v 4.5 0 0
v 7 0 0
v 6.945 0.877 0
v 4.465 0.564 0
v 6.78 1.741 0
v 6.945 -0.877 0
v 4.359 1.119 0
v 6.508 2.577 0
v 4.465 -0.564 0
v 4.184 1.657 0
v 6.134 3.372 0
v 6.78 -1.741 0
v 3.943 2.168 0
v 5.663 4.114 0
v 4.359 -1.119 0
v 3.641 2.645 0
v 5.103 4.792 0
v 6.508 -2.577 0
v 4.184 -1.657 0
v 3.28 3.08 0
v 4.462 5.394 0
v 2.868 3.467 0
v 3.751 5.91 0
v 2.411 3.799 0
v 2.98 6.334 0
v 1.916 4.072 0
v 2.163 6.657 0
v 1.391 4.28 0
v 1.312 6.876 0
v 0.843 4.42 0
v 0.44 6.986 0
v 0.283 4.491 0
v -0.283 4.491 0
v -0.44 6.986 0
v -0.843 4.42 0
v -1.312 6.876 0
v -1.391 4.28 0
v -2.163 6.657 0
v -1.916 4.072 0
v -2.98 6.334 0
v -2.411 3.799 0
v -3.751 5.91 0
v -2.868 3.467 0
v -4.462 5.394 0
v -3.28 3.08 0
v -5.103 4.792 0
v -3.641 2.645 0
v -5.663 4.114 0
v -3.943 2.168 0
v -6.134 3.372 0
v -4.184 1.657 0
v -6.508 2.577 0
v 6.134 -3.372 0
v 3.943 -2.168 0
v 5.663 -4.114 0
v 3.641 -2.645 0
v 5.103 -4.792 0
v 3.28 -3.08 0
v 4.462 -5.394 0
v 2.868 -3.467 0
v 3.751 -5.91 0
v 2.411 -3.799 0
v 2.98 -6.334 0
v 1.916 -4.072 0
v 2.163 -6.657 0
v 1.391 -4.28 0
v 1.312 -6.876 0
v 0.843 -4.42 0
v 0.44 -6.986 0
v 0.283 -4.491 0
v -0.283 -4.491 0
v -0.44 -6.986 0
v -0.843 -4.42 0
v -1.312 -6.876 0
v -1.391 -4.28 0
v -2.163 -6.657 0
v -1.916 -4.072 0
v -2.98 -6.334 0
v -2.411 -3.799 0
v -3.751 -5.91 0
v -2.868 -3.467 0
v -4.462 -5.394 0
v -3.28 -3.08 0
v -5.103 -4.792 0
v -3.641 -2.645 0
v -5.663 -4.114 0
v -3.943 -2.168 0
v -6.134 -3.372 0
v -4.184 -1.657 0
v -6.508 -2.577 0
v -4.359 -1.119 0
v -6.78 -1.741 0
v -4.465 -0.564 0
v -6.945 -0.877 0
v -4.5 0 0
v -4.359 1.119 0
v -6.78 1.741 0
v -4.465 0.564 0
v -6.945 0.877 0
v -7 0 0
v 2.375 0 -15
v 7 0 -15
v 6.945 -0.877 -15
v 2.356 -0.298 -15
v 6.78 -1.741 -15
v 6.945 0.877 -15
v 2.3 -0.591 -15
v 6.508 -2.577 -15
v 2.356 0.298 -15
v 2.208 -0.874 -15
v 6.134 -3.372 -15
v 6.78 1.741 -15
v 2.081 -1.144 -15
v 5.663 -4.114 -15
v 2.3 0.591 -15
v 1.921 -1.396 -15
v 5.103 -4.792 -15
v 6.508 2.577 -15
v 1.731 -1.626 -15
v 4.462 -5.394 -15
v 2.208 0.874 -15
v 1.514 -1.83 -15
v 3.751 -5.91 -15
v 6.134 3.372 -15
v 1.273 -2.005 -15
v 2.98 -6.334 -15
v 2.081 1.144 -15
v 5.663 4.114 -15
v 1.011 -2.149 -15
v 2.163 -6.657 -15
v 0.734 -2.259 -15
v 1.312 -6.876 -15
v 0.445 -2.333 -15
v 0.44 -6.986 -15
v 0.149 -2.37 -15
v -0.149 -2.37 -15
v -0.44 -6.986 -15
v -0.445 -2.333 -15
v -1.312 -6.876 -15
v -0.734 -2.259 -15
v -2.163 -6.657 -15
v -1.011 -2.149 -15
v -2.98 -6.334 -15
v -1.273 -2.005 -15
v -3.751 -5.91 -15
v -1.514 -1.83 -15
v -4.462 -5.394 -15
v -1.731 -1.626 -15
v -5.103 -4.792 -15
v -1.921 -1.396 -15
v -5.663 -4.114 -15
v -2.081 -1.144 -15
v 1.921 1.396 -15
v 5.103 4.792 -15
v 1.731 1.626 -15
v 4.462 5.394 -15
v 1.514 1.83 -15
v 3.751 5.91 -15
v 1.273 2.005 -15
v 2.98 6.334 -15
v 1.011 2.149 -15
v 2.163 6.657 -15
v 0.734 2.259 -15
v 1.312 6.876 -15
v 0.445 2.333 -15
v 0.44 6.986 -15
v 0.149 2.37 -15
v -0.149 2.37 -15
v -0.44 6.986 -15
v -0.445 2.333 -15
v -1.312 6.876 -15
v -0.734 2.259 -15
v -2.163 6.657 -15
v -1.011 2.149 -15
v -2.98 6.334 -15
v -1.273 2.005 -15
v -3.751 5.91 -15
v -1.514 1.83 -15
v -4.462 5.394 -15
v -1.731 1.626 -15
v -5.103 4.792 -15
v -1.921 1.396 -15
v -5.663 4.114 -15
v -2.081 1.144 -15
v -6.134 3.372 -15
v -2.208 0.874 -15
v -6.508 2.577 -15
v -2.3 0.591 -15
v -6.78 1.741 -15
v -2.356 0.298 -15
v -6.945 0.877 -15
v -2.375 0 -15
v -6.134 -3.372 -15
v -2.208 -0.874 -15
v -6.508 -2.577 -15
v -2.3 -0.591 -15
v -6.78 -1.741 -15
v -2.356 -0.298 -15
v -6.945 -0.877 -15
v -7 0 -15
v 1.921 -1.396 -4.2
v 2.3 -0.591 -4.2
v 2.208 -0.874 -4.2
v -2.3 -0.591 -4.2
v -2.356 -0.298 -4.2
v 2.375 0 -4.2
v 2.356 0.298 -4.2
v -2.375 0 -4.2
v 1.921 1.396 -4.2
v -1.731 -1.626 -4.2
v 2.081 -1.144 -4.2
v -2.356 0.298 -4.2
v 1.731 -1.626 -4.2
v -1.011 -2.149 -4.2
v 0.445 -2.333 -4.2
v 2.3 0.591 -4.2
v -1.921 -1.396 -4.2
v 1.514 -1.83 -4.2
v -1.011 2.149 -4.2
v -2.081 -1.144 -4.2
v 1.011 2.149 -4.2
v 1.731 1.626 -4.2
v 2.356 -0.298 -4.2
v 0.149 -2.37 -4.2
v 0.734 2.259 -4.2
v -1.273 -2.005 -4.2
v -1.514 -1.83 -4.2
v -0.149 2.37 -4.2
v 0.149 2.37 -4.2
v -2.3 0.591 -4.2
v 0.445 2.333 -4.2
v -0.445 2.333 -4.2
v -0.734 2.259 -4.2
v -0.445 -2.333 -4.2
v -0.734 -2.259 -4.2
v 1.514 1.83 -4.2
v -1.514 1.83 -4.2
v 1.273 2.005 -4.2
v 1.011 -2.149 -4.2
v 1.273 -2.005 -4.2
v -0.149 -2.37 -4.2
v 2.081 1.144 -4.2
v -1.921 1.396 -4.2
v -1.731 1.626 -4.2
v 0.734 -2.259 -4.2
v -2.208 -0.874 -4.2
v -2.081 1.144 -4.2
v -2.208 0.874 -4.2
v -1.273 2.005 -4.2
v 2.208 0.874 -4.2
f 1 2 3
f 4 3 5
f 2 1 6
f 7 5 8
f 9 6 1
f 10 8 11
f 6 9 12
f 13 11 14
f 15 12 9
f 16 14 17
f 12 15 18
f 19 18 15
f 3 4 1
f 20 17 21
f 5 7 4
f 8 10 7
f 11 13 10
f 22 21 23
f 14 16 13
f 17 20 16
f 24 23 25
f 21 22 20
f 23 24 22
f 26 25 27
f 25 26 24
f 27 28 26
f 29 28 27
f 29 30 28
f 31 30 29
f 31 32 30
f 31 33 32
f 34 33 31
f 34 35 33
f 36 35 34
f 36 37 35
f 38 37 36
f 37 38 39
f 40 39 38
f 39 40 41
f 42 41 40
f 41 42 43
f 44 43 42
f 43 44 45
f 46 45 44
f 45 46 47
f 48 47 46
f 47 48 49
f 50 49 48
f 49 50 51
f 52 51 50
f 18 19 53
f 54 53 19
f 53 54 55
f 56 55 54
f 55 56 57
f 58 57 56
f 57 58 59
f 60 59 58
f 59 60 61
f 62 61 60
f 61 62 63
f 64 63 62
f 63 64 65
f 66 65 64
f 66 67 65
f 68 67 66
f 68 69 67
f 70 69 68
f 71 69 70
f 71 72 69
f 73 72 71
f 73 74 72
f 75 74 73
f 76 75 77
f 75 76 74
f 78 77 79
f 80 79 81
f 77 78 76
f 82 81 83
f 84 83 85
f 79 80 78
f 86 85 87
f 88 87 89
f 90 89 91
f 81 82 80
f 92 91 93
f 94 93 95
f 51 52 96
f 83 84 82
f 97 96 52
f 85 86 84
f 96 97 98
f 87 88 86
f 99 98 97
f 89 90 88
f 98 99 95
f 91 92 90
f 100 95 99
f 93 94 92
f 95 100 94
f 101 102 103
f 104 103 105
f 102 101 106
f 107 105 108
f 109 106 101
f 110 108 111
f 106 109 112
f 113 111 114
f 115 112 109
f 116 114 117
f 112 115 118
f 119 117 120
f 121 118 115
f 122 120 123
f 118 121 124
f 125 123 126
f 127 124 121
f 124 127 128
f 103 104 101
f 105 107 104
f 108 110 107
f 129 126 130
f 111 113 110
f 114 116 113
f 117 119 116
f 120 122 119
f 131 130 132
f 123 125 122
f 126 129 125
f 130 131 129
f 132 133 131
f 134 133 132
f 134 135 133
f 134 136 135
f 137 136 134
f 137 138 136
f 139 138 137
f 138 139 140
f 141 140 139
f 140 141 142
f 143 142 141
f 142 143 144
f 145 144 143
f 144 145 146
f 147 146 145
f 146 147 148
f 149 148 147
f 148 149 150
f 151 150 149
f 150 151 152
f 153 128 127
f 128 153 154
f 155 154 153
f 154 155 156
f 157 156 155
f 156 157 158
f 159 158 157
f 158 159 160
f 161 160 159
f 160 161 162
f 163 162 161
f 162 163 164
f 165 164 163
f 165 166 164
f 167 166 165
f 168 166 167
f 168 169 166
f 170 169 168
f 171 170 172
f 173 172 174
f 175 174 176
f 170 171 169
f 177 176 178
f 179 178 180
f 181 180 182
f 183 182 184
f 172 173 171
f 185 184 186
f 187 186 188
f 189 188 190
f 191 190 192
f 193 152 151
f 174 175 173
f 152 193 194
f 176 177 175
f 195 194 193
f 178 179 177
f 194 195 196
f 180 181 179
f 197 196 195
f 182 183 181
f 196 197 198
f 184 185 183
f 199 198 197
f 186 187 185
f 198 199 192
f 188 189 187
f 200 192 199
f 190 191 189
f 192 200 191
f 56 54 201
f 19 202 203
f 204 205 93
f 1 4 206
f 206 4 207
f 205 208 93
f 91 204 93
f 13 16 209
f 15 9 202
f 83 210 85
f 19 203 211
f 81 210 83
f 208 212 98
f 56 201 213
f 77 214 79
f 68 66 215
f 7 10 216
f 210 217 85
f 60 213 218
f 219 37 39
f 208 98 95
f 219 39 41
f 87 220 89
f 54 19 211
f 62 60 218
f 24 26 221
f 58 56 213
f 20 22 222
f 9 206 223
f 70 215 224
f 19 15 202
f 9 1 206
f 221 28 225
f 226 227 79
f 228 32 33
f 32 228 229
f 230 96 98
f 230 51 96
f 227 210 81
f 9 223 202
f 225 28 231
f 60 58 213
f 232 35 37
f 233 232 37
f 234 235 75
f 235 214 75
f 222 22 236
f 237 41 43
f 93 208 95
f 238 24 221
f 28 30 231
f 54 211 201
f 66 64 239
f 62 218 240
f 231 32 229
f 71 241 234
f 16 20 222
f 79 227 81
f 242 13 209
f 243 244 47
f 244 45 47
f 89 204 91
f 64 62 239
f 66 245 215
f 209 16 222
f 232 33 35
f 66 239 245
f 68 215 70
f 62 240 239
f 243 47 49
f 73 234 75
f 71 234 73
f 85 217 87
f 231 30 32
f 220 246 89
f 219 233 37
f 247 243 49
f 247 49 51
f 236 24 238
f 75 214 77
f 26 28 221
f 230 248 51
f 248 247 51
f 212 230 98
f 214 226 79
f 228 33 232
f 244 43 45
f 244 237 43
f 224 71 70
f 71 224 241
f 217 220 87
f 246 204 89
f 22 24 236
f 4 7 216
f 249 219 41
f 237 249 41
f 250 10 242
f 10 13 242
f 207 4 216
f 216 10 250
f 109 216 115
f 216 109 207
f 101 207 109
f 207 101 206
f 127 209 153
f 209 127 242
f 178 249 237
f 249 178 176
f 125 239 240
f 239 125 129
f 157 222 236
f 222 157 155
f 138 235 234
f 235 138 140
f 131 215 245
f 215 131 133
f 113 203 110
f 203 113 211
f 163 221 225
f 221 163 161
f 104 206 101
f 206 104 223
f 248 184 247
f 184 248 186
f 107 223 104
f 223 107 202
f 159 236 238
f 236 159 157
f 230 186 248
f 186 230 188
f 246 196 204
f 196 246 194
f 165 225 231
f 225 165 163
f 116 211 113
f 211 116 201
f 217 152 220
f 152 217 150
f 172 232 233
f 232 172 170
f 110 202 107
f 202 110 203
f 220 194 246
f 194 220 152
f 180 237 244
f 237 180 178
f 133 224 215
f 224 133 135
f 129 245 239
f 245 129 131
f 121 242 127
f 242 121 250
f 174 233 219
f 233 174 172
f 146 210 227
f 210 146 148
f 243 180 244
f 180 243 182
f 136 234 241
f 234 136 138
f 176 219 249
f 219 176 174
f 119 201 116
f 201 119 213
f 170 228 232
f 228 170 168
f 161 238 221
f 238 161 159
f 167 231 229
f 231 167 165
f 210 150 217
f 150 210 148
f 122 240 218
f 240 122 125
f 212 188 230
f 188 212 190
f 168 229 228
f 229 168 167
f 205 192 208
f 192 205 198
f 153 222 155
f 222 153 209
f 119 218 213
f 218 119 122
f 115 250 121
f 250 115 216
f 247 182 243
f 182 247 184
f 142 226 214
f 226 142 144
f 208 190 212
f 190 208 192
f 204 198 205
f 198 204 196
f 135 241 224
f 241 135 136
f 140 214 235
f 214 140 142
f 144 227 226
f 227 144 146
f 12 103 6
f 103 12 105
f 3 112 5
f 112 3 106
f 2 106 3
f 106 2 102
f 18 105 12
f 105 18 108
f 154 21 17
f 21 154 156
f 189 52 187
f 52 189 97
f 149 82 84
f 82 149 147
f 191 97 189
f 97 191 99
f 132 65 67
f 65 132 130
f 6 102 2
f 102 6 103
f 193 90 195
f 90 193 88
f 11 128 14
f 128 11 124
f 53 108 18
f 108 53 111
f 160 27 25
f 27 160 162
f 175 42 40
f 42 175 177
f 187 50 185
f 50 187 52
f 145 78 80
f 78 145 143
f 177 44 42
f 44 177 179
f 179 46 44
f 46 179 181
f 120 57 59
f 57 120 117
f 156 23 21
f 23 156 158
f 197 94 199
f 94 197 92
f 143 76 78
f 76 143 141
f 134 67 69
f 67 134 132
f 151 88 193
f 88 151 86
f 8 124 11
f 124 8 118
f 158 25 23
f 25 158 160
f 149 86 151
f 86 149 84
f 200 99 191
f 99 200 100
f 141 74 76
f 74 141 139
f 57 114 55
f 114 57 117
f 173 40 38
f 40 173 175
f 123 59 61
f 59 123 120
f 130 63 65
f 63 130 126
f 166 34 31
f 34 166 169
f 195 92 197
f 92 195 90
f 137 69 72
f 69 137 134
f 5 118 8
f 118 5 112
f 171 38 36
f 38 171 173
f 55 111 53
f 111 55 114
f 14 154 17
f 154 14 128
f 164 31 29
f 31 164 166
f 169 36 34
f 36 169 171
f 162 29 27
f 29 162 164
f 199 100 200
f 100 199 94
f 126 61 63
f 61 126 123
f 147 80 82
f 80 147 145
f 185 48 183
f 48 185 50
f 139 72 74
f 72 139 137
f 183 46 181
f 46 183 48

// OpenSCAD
$fn = 50;


difference() {
	union() {
		translate(v = [0, 0, -15.0000000000]) {
			cylinder(h = 15, r = 7.0000000000);
		}
		cylinder(h = 0, r = 17.0000000000);
	}
	union() {
		translate(v = [0, 0, 0]) {
			rotate(a = [0, 0, 0]) {
				difference() {
					union() {
						#translate(v = [0, 0, -15.0000000000]) {
							cylinder(h = 15, r = 2.2500000000);
						}
						#translate(v = [0, 0, -4.2000000000]) {
							cylinder(h = 4.2000000000, r = 7.0000000000, r1 = 2.3750000000, r2 = 4.5000000000);
						}
						#translate(v = [0, 0, -15.0000000000]) {
							cylinder(h = 15, r = 2.3750000000);
						}
						#translate(v = [0, 0, -15.0000000000]) {
							cylinder(h = 15, r = 2.2500000000);
						}
					}
					union();
				}
			}
		}
	}
}
